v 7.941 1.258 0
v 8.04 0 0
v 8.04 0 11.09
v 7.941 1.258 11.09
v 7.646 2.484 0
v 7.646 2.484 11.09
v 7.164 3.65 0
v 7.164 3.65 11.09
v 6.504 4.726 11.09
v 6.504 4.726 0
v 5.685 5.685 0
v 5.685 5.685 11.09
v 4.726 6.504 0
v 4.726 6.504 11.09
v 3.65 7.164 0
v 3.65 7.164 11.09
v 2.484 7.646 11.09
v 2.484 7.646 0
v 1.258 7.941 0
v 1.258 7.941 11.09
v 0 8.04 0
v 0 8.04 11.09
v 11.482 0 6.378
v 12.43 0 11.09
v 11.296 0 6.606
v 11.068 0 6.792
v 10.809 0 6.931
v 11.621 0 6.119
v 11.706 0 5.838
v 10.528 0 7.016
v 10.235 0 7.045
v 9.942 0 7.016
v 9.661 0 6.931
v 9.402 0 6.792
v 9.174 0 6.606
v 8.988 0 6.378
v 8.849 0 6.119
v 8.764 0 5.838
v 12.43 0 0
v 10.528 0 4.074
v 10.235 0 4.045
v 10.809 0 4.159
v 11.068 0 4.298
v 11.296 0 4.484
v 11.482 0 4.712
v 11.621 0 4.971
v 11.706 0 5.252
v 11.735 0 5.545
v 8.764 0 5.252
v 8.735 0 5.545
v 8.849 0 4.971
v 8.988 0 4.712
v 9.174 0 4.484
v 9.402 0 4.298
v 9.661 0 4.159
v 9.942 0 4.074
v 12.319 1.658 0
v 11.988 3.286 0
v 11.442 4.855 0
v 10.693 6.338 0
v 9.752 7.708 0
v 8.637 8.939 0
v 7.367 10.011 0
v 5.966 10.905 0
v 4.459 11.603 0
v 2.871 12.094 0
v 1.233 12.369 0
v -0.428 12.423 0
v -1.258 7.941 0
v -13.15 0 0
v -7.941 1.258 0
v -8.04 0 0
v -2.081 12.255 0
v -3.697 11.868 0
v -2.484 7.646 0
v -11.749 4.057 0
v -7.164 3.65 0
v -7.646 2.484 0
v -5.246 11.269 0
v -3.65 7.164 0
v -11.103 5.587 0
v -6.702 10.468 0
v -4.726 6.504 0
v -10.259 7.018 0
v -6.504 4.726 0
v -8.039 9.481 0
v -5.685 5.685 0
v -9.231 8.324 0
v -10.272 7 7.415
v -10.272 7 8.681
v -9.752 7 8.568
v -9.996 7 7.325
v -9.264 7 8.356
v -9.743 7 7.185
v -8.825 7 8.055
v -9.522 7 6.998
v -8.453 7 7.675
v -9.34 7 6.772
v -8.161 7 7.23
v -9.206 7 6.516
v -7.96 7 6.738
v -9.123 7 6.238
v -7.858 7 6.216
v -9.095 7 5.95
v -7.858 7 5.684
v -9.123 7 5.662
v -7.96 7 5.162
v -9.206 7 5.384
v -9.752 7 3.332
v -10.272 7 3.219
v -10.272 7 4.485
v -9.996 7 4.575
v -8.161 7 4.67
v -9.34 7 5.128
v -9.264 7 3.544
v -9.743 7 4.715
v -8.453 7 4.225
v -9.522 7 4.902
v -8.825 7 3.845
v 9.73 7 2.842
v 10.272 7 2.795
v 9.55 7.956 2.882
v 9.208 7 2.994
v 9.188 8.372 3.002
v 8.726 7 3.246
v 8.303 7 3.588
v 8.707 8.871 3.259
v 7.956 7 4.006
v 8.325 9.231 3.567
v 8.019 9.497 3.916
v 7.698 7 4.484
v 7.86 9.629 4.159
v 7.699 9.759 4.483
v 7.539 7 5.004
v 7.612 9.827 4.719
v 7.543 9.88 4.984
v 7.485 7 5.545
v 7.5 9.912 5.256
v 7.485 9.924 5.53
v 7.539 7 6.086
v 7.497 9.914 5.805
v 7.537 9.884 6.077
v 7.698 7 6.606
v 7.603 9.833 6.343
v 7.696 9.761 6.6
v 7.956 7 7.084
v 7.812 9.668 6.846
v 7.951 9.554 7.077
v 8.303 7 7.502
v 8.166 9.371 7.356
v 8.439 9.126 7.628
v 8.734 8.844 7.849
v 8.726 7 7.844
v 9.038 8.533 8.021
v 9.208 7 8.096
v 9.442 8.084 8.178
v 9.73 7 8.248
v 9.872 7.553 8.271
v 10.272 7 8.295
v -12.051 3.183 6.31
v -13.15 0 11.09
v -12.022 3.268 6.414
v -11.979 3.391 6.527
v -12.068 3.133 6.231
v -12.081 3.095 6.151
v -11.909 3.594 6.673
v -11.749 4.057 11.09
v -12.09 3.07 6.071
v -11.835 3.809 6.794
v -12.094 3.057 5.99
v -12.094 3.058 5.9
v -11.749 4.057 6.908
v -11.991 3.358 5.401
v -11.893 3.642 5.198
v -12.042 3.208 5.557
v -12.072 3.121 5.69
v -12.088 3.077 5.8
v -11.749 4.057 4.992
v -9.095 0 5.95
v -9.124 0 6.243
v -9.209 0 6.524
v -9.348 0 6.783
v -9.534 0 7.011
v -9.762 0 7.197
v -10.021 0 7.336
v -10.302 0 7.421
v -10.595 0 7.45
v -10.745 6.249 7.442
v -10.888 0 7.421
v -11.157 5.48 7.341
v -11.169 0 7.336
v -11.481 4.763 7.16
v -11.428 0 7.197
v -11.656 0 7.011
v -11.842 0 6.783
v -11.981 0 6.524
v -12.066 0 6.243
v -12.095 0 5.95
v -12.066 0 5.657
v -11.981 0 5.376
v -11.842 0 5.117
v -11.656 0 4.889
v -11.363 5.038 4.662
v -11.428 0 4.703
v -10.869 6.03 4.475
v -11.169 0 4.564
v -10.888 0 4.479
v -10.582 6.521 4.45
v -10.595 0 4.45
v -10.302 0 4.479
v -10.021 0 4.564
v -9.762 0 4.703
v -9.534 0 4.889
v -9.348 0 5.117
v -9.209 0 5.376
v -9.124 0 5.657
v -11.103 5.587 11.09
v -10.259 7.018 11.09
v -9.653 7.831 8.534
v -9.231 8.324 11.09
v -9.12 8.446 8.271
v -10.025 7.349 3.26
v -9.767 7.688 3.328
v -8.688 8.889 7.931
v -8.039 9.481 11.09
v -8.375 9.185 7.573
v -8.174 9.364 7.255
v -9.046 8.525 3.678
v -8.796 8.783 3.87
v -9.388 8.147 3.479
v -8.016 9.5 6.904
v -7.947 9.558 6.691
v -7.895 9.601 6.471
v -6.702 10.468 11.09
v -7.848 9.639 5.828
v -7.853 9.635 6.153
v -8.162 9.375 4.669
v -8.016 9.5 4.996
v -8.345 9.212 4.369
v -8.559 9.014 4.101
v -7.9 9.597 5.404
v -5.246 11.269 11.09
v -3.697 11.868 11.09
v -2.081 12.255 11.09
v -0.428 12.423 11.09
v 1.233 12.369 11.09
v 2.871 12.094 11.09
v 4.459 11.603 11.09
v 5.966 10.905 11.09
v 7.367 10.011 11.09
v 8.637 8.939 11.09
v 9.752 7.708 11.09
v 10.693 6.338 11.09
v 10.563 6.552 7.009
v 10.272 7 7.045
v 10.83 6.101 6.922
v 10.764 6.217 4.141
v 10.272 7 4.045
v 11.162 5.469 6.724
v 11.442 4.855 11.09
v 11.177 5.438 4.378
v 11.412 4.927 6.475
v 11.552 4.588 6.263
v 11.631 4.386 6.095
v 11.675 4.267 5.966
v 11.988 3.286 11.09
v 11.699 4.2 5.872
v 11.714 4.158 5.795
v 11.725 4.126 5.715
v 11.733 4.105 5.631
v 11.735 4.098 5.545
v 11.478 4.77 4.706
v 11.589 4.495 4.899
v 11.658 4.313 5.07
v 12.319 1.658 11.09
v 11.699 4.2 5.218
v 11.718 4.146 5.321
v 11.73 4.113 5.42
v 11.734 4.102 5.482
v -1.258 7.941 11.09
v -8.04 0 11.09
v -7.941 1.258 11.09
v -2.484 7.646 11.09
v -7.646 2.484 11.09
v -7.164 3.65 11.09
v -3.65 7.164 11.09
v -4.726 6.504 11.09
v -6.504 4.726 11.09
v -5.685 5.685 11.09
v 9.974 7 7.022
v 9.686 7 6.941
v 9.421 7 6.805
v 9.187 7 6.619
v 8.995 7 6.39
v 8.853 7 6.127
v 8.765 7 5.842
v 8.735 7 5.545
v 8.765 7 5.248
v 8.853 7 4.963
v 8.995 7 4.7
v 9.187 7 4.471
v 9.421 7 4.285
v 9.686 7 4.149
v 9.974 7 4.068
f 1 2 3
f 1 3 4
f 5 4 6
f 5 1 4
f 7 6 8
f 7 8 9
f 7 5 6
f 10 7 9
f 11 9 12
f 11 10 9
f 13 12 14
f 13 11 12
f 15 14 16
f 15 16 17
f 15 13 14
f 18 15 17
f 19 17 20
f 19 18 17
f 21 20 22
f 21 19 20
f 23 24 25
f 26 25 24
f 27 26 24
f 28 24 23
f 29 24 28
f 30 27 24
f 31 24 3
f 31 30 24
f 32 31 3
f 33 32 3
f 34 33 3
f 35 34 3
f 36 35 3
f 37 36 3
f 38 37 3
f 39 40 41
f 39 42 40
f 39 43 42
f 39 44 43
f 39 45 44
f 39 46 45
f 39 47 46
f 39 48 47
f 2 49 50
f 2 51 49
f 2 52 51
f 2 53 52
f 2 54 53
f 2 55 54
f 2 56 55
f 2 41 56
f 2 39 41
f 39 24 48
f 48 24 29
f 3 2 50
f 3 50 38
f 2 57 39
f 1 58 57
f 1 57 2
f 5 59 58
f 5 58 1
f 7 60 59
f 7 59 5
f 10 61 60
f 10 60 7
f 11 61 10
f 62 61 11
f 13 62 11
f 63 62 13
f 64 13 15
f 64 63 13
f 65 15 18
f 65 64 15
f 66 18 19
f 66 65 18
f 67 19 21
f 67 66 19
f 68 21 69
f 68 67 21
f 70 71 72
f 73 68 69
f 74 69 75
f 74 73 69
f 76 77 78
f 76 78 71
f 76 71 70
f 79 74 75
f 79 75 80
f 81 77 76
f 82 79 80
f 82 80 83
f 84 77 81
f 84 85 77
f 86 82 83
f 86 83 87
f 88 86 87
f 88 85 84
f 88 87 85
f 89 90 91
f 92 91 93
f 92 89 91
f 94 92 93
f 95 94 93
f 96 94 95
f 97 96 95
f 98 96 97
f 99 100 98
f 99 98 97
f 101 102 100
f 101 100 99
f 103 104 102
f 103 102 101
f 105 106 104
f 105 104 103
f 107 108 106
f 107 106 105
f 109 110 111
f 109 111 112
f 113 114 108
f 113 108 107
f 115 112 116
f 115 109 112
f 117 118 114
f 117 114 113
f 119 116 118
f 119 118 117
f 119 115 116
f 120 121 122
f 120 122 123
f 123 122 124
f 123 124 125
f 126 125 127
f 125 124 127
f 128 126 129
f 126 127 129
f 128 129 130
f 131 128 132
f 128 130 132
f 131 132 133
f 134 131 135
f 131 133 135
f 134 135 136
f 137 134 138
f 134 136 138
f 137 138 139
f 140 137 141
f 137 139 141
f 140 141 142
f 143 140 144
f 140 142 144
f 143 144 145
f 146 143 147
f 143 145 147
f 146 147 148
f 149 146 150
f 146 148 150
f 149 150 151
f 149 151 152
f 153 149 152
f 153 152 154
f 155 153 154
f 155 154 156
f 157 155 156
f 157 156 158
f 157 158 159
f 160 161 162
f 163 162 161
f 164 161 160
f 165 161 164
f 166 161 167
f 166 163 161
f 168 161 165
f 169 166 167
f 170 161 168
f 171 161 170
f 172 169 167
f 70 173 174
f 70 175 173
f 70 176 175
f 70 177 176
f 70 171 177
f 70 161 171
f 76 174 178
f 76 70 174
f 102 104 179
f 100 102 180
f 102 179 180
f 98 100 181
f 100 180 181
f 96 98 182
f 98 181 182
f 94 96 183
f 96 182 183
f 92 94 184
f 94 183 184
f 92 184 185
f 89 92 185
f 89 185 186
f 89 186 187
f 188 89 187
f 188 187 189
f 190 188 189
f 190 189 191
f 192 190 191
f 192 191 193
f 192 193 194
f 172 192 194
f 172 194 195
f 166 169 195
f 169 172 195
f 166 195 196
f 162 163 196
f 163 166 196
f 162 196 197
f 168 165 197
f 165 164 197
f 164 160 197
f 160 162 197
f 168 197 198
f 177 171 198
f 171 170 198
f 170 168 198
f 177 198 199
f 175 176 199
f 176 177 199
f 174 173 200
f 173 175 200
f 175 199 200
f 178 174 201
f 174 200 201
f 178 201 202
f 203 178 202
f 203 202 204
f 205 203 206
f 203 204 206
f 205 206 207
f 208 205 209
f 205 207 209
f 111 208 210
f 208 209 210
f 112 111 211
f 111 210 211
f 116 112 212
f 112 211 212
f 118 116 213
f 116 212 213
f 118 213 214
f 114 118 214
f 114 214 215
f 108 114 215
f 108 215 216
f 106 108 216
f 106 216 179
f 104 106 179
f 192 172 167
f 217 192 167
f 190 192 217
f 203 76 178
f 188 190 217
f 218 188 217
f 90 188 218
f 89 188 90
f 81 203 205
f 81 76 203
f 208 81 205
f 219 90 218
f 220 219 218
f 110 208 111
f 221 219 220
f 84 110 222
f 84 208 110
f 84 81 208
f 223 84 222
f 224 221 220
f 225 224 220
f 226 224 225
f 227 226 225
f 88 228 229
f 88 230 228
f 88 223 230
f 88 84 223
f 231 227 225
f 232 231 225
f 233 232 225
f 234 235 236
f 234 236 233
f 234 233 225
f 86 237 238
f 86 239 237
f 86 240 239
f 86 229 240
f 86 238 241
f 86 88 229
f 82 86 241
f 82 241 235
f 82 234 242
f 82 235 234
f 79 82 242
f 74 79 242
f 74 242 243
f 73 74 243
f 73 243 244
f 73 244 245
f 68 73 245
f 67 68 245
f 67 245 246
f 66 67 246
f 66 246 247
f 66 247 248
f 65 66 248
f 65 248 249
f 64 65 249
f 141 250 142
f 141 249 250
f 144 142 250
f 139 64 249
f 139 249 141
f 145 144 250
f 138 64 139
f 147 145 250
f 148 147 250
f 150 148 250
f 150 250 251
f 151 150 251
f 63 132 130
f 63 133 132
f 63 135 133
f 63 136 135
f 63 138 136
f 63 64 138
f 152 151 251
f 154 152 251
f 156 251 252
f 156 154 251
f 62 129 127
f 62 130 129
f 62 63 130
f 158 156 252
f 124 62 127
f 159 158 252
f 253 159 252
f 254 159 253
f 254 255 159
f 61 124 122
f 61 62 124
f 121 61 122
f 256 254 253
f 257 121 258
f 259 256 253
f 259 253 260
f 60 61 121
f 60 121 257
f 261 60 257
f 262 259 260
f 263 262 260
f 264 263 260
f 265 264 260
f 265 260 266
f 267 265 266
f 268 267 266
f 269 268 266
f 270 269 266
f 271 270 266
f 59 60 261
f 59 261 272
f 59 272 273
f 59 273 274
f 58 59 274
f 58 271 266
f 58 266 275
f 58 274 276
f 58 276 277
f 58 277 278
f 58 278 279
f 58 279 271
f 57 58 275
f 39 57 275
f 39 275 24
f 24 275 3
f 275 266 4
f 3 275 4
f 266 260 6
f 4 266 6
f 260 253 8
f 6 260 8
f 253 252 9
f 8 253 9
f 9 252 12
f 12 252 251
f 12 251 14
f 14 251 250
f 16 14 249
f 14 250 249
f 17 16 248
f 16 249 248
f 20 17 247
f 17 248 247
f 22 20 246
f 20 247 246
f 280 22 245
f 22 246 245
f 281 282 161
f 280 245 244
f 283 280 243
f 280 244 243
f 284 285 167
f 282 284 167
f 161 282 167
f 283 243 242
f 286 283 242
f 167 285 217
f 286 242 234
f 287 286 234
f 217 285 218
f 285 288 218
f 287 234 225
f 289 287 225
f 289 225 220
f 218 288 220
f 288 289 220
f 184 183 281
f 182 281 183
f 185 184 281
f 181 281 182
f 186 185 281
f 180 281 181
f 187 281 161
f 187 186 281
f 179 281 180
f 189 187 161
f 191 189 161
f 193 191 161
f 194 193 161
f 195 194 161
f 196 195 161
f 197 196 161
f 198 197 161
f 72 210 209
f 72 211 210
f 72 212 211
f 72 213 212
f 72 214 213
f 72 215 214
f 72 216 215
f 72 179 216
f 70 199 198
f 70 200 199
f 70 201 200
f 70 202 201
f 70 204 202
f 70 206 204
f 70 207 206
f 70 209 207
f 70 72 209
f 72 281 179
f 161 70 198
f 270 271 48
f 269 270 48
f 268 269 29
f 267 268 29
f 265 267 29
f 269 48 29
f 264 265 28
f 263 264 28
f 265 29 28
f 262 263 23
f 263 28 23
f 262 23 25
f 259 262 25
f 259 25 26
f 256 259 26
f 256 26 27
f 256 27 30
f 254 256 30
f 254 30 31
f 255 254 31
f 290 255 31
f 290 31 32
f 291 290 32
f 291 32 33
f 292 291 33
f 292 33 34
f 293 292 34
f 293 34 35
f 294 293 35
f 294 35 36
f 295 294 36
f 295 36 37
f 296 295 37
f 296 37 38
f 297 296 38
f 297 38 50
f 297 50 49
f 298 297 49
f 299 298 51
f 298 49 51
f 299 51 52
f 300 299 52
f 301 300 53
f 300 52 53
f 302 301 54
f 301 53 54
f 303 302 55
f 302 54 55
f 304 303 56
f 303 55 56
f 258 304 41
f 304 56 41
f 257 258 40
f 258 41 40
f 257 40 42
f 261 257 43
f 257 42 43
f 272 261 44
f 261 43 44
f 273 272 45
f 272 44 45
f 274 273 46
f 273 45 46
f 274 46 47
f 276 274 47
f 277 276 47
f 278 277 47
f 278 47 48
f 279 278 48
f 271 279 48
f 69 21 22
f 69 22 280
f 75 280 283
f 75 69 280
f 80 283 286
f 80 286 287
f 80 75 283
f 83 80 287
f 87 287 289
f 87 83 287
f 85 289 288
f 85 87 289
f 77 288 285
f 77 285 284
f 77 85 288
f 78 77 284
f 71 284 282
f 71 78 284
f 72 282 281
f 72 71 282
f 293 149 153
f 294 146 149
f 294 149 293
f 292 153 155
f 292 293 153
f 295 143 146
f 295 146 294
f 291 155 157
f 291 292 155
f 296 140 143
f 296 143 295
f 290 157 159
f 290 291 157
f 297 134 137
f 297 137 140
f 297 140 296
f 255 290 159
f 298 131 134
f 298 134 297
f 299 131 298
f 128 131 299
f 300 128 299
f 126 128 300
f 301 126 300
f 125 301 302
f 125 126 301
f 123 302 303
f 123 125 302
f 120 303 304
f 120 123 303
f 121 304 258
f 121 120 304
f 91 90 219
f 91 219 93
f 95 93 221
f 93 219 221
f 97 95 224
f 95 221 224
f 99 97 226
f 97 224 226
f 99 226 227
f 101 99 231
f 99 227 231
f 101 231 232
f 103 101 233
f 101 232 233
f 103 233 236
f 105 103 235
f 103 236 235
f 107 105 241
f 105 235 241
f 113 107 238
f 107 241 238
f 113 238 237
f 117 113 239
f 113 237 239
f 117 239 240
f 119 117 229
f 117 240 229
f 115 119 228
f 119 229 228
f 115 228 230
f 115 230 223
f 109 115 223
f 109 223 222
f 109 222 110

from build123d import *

# Parameters (mm, degrees)
BOSS_EXTRUDE1_DEPTH = 11.09
SKETCH3_R           = 1.5
CUT_EXTRUDE4_DEPTH  = 10
SKETCH4_R           = 2.75
CUT_EXTRUDE3_DEPTH  = 2.5


with BuildPart() as part:
    # Sketch1 → Boss-Extrude1 (new body)
    with BuildSketch(Plane.XY):
        with BuildLine():
            Line((-8.04, 0), (-13.15, 0))
            Line((-13.15, 0), (-11.749422053, 4.05659727))
            ThreePointArc((-11.749422053, 4.05659727), (2.056645798, 12.258674809), (12.43, 0))
            Line((12.43, 0), (8.04, 0))
            ThreePointArc((8.04, 0), (5.685138521, 5.685138521), (0, 8.04))
            ThreePointArc((0, 8.04), (-5.685138521, 5.685138521), (-8.04, 0))
        make_face()
    extrude(amount=BOSS_EXTRUDE1_DEPTH)

    # Sketch3 → Cut-Extrude4 (cut)
    with BuildSketch(Plane.XZ):
        with Locations((-10.595, 5.95)):
            Circle(SKETCH3_R)
        with Locations((10.235, 5.545)):
            Circle(SKETCH3_R)
    extrude(amount=-CUT_EXTRUDE4_DEPTH, mode=Mode.SUBTRACT)

    # Sketch4 → Cut-Extrude3 (cut, symmetric)
    with BuildSketch(Plane(origin=(0, 9.5, 0), x_dir=(1, 0, 0), z_dir=(0, 1, 0))):
        with Locations((-10.595, -5.95)):
            Circle(SKETCH4_R)
        with Locations((10.235, -5.545)):
            Circle(SKETCH4_R)
    extrude(amount=CUT_EXTRUDE3_DEPTH, both=True, mode=Mode.SUBTRACT)


solid = part.part
